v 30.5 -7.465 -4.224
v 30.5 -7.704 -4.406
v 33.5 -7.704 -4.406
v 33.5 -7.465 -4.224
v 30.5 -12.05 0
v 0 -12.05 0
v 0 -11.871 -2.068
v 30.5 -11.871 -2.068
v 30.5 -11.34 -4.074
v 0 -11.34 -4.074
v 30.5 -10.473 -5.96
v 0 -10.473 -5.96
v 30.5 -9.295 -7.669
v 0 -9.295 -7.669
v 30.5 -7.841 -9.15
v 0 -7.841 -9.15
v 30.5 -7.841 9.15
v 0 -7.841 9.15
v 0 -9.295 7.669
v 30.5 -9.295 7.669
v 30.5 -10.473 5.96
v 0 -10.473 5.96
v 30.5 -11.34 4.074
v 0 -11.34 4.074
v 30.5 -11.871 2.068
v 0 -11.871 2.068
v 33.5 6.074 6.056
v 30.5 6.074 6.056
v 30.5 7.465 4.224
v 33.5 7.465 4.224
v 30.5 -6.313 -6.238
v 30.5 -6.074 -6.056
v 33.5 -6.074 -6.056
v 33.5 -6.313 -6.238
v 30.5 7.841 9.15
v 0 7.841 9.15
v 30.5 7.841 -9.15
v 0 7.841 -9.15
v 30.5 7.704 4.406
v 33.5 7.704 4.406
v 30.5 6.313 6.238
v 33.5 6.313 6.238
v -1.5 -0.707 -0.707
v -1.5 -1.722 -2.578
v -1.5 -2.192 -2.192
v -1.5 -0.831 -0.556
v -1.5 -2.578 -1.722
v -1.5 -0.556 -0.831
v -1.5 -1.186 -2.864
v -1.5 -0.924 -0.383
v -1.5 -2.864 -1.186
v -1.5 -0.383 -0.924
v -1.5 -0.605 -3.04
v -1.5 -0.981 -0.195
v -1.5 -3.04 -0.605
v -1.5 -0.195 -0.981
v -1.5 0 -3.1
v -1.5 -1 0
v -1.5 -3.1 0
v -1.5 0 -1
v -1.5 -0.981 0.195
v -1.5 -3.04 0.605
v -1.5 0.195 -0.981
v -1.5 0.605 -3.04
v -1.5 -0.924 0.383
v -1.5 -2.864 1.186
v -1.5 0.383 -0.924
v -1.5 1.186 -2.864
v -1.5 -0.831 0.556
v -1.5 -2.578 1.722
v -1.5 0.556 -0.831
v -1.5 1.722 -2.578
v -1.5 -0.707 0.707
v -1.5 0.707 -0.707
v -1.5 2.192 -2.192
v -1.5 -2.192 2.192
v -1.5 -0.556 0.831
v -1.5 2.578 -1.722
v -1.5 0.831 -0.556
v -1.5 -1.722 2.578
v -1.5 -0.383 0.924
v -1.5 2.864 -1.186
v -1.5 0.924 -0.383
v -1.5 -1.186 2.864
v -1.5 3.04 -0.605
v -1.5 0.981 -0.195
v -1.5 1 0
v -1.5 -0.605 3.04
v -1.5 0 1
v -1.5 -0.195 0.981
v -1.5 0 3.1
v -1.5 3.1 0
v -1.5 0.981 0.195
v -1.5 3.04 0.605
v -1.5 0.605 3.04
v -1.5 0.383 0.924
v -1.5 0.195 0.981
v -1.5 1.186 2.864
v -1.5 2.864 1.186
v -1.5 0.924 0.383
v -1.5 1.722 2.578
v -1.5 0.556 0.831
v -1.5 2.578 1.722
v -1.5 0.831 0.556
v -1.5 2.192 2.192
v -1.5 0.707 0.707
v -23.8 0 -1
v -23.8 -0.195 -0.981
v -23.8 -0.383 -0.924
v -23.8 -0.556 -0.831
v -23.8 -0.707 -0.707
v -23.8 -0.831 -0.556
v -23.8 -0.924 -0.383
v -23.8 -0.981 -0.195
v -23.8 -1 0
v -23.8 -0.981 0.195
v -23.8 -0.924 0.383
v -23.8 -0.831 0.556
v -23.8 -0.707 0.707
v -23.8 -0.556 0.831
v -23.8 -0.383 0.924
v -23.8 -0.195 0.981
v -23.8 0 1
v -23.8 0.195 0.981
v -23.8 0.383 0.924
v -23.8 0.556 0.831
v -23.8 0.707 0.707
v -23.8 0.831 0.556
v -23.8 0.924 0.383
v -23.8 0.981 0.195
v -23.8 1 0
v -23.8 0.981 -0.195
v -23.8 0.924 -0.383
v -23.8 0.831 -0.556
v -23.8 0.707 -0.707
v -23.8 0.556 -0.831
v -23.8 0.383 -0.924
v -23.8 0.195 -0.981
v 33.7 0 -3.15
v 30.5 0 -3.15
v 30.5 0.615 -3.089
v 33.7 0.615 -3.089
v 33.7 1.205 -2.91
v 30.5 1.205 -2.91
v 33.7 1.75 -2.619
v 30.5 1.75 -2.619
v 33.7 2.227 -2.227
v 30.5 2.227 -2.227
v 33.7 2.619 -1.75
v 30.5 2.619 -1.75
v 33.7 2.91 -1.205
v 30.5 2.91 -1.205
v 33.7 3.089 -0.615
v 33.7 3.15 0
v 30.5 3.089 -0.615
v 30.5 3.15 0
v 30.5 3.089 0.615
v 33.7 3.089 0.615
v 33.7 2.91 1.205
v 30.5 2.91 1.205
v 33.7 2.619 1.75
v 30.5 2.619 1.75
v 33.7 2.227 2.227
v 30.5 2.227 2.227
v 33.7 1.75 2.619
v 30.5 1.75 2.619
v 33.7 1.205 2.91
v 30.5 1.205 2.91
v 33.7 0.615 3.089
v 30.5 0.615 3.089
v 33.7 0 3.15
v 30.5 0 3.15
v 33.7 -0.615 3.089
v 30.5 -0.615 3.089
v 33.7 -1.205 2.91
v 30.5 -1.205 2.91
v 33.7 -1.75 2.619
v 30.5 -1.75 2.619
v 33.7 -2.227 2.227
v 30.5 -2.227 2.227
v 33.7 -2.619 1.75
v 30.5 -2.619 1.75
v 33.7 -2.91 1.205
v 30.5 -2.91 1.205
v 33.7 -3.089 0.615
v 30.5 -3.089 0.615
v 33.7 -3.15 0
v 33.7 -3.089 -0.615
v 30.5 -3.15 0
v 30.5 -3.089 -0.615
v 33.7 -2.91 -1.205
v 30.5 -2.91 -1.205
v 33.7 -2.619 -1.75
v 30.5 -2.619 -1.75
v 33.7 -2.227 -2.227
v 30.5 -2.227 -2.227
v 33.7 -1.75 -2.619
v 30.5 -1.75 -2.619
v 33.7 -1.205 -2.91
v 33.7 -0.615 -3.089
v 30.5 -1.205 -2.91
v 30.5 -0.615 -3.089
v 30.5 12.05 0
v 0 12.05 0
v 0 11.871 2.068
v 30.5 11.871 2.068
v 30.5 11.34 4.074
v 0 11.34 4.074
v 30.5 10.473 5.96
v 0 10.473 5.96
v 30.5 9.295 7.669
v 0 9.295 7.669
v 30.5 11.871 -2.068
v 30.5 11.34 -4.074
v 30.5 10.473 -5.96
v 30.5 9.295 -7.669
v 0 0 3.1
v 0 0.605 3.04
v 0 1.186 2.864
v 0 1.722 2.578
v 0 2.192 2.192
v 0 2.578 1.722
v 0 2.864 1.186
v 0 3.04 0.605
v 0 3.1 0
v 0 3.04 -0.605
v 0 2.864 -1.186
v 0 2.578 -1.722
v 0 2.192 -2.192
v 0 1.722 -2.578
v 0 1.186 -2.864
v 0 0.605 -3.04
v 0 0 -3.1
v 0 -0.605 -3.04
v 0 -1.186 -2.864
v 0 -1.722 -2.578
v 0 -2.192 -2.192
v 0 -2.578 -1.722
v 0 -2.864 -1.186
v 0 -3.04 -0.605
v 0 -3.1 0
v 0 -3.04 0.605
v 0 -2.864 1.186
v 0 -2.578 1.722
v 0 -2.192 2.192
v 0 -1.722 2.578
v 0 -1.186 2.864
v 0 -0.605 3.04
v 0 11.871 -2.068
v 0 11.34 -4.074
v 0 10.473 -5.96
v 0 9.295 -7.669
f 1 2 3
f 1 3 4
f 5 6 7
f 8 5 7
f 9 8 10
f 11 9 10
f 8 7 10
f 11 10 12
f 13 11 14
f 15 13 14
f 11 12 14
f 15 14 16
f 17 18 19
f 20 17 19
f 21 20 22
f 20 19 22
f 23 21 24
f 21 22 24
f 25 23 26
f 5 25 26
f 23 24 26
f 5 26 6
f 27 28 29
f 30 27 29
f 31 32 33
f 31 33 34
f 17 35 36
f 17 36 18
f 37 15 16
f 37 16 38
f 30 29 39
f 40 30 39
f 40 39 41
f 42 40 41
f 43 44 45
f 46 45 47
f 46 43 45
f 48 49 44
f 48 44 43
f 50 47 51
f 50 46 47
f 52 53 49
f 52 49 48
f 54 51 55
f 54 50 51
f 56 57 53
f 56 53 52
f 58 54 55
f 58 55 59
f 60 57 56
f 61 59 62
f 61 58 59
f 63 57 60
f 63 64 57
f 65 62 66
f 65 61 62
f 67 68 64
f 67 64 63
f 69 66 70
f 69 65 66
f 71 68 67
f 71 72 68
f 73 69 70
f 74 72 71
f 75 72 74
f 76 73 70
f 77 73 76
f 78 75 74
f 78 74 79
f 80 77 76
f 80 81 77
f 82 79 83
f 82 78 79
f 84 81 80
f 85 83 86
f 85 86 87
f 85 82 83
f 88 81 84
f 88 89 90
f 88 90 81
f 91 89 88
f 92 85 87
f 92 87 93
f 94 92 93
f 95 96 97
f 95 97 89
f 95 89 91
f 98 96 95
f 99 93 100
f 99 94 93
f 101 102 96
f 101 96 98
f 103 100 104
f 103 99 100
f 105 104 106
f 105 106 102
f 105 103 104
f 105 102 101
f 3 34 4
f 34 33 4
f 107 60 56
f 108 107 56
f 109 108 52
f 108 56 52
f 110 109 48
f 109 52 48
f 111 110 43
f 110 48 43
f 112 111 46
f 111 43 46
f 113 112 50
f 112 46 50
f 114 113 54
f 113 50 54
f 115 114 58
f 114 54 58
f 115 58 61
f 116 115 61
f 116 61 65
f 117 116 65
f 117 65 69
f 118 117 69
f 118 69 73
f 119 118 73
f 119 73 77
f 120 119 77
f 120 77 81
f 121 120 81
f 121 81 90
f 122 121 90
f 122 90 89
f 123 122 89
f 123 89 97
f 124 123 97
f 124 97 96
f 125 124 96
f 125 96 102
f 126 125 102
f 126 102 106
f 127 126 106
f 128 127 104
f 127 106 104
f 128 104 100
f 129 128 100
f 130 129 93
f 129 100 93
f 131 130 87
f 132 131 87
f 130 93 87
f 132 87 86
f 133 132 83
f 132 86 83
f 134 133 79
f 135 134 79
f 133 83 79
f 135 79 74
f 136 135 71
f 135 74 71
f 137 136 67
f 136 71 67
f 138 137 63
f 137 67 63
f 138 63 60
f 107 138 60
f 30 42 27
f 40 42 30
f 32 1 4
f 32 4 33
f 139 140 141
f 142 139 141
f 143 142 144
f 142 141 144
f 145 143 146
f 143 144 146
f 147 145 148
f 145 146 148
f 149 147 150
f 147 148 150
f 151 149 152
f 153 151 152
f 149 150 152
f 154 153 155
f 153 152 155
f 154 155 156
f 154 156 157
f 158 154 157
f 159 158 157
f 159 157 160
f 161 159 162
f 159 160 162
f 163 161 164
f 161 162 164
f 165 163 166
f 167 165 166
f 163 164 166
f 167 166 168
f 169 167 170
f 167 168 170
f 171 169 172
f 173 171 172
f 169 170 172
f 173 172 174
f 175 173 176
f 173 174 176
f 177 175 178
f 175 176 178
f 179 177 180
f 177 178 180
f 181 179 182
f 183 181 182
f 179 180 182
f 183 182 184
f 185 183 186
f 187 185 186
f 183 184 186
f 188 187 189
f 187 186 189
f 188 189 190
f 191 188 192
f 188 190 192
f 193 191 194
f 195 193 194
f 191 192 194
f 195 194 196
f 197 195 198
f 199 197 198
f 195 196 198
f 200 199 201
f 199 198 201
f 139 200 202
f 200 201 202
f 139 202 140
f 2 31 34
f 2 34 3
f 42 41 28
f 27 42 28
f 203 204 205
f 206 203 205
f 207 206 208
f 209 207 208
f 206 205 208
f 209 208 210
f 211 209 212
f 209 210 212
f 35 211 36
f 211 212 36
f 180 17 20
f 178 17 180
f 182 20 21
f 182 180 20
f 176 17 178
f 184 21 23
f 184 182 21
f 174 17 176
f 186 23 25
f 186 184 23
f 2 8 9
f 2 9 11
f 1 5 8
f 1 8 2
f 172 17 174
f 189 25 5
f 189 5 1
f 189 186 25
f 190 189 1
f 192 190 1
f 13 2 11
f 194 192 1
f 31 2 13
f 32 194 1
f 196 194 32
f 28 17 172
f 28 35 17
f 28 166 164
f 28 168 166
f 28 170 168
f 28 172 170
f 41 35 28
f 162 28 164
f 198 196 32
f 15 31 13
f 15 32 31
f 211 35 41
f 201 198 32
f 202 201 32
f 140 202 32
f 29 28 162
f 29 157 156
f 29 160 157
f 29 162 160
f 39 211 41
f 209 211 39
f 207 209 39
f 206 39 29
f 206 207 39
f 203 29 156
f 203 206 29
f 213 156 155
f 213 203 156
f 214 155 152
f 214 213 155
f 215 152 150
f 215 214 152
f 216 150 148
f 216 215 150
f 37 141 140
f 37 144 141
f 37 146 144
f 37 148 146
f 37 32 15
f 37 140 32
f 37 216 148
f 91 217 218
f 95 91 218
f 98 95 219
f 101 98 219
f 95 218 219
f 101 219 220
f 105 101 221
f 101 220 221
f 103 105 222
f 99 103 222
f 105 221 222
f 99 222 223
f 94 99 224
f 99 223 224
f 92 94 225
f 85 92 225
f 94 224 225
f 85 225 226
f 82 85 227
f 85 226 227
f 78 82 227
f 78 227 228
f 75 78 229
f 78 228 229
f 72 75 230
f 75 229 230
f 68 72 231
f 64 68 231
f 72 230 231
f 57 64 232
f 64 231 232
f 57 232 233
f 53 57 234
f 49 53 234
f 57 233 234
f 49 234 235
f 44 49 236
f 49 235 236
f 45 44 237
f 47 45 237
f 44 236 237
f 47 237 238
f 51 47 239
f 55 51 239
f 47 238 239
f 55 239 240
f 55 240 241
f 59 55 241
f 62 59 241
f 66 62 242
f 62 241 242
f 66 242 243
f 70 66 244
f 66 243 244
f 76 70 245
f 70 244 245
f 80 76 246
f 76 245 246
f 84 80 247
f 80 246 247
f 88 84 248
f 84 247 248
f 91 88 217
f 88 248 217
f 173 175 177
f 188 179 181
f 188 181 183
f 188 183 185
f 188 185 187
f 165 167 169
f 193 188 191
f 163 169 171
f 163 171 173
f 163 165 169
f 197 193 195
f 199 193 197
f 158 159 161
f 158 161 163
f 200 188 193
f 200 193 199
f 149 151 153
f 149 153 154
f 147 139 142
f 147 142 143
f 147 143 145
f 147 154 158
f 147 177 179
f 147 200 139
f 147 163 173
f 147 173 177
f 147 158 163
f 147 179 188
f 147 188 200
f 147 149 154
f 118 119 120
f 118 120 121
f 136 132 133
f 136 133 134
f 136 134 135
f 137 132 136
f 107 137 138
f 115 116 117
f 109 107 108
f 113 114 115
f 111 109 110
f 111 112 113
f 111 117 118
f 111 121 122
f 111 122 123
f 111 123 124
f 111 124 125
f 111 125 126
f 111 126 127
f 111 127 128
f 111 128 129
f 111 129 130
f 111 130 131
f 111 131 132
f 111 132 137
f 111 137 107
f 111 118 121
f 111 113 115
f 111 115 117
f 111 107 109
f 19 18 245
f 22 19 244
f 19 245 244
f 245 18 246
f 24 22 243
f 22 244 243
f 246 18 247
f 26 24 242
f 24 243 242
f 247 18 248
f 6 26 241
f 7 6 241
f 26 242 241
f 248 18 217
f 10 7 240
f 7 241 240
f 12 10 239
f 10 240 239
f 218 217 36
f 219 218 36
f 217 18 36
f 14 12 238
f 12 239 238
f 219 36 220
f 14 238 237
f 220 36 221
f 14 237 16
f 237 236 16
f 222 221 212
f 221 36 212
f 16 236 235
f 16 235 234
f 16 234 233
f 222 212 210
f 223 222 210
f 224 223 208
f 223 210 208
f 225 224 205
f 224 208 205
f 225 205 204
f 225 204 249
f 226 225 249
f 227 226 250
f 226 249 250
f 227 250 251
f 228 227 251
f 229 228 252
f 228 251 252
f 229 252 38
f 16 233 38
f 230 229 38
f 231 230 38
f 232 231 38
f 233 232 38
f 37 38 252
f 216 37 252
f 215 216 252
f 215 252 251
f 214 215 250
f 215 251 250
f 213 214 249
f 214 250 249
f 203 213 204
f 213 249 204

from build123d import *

# Parameters (mm, degrees)
EXTRUDE_1_DEPTH = 30.5
SKETCH_2_R      = 3.1
EXTRUDE_2_DEPTH = 1.5
EXTRUDE_START   = -1.5
SKETCH_3_R      = 1
EXTRUDE_3_DEPTH = 23.8
SKETCH_5_R      = 3.15
EXTRUDE_4_DEPTH = 3.2
EXTRUDE_5_DEPTH = 3


with BuildPart() as part:
    # 草图1 → 凸台-拉伸1 (new body)
    with BuildSketch(Plane(origin=(0, 0, 0), x_dir=(0, 0, -1), z_dir=(1, 0, 0))):
        with BuildLine():
            ThreePointArc((-9.15, -7.840918314), (-5.035843242, -10.947272849), (0, -12.05))
            ThreePointArc((0, -12.05), (5.035843242, -10.947272849), (9.15, -7.840918314))
            Line((9.15, -7.840918314), (9.15, 7.840918314))
            ThreePointArc((9.15, 7.840918314), (5.035843234, 10.947272853), (-1.8e-08, 12.05))
            ThreePointArc((-1.8e-08, 12.05), (-5.03584325, 10.947272846), (-9.15, 7.840918314))
            Line((-9.15, 7.840918314), (-9.15, -7.840918314))
        make_face()
    extrude(amount=EXTRUDE_1_DEPTH)

    # 草图2 → 凸台-拉伸2 (add)
    with BuildSketch(Plane.ZY):
        Circle(SKETCH_2_R)
    extrude(amount=EXTRUDE_2_DEPTH)

    # 草图3 → 凸台-拉伸3 (add)
    with BuildSketch(Plane.ZY.offset(1.5).offset(EXTRUDE_START)):
        with Locations(Location((0, 0, 0), (0, 0, 180))):
            Circle(SKETCH_3_R)
    extrude(amount=EXTRUDE_3_DEPTH)

    # 草图5 → 凸台-拉伸4 (add)
    with BuildSketch(Plane(origin=(30.5, 0, 0), x_dir=(0, 0, -1), z_dir=(1, 0, 0))):
        Circle(SKETCH_5_R)
    extrude(amount=EXTRUDE_4_DEPTH)

    # 草图6 → 凸台-拉伸5 (add)
    with BuildSketch(Plane(origin=(30.5, 0, 0), x_dir=(0, 0, -1), z_dir=(1, 0, 0))):
        Polygon((-6.056237864, 6.074082889), (-4.224479128, 7.465003423), (-4.405903545, 7.703928475), (-6.237662281, 6.313007941), align=None)
        Polygon((6.237662281, -6.313007941), (4.405903545, -7.703928475), (4.224479128, -7.465003423), (6.056237864, -6.074082889), align=None)
    extrude(amount=EXTRUDE_5_DEPTH)


solid = part.part
